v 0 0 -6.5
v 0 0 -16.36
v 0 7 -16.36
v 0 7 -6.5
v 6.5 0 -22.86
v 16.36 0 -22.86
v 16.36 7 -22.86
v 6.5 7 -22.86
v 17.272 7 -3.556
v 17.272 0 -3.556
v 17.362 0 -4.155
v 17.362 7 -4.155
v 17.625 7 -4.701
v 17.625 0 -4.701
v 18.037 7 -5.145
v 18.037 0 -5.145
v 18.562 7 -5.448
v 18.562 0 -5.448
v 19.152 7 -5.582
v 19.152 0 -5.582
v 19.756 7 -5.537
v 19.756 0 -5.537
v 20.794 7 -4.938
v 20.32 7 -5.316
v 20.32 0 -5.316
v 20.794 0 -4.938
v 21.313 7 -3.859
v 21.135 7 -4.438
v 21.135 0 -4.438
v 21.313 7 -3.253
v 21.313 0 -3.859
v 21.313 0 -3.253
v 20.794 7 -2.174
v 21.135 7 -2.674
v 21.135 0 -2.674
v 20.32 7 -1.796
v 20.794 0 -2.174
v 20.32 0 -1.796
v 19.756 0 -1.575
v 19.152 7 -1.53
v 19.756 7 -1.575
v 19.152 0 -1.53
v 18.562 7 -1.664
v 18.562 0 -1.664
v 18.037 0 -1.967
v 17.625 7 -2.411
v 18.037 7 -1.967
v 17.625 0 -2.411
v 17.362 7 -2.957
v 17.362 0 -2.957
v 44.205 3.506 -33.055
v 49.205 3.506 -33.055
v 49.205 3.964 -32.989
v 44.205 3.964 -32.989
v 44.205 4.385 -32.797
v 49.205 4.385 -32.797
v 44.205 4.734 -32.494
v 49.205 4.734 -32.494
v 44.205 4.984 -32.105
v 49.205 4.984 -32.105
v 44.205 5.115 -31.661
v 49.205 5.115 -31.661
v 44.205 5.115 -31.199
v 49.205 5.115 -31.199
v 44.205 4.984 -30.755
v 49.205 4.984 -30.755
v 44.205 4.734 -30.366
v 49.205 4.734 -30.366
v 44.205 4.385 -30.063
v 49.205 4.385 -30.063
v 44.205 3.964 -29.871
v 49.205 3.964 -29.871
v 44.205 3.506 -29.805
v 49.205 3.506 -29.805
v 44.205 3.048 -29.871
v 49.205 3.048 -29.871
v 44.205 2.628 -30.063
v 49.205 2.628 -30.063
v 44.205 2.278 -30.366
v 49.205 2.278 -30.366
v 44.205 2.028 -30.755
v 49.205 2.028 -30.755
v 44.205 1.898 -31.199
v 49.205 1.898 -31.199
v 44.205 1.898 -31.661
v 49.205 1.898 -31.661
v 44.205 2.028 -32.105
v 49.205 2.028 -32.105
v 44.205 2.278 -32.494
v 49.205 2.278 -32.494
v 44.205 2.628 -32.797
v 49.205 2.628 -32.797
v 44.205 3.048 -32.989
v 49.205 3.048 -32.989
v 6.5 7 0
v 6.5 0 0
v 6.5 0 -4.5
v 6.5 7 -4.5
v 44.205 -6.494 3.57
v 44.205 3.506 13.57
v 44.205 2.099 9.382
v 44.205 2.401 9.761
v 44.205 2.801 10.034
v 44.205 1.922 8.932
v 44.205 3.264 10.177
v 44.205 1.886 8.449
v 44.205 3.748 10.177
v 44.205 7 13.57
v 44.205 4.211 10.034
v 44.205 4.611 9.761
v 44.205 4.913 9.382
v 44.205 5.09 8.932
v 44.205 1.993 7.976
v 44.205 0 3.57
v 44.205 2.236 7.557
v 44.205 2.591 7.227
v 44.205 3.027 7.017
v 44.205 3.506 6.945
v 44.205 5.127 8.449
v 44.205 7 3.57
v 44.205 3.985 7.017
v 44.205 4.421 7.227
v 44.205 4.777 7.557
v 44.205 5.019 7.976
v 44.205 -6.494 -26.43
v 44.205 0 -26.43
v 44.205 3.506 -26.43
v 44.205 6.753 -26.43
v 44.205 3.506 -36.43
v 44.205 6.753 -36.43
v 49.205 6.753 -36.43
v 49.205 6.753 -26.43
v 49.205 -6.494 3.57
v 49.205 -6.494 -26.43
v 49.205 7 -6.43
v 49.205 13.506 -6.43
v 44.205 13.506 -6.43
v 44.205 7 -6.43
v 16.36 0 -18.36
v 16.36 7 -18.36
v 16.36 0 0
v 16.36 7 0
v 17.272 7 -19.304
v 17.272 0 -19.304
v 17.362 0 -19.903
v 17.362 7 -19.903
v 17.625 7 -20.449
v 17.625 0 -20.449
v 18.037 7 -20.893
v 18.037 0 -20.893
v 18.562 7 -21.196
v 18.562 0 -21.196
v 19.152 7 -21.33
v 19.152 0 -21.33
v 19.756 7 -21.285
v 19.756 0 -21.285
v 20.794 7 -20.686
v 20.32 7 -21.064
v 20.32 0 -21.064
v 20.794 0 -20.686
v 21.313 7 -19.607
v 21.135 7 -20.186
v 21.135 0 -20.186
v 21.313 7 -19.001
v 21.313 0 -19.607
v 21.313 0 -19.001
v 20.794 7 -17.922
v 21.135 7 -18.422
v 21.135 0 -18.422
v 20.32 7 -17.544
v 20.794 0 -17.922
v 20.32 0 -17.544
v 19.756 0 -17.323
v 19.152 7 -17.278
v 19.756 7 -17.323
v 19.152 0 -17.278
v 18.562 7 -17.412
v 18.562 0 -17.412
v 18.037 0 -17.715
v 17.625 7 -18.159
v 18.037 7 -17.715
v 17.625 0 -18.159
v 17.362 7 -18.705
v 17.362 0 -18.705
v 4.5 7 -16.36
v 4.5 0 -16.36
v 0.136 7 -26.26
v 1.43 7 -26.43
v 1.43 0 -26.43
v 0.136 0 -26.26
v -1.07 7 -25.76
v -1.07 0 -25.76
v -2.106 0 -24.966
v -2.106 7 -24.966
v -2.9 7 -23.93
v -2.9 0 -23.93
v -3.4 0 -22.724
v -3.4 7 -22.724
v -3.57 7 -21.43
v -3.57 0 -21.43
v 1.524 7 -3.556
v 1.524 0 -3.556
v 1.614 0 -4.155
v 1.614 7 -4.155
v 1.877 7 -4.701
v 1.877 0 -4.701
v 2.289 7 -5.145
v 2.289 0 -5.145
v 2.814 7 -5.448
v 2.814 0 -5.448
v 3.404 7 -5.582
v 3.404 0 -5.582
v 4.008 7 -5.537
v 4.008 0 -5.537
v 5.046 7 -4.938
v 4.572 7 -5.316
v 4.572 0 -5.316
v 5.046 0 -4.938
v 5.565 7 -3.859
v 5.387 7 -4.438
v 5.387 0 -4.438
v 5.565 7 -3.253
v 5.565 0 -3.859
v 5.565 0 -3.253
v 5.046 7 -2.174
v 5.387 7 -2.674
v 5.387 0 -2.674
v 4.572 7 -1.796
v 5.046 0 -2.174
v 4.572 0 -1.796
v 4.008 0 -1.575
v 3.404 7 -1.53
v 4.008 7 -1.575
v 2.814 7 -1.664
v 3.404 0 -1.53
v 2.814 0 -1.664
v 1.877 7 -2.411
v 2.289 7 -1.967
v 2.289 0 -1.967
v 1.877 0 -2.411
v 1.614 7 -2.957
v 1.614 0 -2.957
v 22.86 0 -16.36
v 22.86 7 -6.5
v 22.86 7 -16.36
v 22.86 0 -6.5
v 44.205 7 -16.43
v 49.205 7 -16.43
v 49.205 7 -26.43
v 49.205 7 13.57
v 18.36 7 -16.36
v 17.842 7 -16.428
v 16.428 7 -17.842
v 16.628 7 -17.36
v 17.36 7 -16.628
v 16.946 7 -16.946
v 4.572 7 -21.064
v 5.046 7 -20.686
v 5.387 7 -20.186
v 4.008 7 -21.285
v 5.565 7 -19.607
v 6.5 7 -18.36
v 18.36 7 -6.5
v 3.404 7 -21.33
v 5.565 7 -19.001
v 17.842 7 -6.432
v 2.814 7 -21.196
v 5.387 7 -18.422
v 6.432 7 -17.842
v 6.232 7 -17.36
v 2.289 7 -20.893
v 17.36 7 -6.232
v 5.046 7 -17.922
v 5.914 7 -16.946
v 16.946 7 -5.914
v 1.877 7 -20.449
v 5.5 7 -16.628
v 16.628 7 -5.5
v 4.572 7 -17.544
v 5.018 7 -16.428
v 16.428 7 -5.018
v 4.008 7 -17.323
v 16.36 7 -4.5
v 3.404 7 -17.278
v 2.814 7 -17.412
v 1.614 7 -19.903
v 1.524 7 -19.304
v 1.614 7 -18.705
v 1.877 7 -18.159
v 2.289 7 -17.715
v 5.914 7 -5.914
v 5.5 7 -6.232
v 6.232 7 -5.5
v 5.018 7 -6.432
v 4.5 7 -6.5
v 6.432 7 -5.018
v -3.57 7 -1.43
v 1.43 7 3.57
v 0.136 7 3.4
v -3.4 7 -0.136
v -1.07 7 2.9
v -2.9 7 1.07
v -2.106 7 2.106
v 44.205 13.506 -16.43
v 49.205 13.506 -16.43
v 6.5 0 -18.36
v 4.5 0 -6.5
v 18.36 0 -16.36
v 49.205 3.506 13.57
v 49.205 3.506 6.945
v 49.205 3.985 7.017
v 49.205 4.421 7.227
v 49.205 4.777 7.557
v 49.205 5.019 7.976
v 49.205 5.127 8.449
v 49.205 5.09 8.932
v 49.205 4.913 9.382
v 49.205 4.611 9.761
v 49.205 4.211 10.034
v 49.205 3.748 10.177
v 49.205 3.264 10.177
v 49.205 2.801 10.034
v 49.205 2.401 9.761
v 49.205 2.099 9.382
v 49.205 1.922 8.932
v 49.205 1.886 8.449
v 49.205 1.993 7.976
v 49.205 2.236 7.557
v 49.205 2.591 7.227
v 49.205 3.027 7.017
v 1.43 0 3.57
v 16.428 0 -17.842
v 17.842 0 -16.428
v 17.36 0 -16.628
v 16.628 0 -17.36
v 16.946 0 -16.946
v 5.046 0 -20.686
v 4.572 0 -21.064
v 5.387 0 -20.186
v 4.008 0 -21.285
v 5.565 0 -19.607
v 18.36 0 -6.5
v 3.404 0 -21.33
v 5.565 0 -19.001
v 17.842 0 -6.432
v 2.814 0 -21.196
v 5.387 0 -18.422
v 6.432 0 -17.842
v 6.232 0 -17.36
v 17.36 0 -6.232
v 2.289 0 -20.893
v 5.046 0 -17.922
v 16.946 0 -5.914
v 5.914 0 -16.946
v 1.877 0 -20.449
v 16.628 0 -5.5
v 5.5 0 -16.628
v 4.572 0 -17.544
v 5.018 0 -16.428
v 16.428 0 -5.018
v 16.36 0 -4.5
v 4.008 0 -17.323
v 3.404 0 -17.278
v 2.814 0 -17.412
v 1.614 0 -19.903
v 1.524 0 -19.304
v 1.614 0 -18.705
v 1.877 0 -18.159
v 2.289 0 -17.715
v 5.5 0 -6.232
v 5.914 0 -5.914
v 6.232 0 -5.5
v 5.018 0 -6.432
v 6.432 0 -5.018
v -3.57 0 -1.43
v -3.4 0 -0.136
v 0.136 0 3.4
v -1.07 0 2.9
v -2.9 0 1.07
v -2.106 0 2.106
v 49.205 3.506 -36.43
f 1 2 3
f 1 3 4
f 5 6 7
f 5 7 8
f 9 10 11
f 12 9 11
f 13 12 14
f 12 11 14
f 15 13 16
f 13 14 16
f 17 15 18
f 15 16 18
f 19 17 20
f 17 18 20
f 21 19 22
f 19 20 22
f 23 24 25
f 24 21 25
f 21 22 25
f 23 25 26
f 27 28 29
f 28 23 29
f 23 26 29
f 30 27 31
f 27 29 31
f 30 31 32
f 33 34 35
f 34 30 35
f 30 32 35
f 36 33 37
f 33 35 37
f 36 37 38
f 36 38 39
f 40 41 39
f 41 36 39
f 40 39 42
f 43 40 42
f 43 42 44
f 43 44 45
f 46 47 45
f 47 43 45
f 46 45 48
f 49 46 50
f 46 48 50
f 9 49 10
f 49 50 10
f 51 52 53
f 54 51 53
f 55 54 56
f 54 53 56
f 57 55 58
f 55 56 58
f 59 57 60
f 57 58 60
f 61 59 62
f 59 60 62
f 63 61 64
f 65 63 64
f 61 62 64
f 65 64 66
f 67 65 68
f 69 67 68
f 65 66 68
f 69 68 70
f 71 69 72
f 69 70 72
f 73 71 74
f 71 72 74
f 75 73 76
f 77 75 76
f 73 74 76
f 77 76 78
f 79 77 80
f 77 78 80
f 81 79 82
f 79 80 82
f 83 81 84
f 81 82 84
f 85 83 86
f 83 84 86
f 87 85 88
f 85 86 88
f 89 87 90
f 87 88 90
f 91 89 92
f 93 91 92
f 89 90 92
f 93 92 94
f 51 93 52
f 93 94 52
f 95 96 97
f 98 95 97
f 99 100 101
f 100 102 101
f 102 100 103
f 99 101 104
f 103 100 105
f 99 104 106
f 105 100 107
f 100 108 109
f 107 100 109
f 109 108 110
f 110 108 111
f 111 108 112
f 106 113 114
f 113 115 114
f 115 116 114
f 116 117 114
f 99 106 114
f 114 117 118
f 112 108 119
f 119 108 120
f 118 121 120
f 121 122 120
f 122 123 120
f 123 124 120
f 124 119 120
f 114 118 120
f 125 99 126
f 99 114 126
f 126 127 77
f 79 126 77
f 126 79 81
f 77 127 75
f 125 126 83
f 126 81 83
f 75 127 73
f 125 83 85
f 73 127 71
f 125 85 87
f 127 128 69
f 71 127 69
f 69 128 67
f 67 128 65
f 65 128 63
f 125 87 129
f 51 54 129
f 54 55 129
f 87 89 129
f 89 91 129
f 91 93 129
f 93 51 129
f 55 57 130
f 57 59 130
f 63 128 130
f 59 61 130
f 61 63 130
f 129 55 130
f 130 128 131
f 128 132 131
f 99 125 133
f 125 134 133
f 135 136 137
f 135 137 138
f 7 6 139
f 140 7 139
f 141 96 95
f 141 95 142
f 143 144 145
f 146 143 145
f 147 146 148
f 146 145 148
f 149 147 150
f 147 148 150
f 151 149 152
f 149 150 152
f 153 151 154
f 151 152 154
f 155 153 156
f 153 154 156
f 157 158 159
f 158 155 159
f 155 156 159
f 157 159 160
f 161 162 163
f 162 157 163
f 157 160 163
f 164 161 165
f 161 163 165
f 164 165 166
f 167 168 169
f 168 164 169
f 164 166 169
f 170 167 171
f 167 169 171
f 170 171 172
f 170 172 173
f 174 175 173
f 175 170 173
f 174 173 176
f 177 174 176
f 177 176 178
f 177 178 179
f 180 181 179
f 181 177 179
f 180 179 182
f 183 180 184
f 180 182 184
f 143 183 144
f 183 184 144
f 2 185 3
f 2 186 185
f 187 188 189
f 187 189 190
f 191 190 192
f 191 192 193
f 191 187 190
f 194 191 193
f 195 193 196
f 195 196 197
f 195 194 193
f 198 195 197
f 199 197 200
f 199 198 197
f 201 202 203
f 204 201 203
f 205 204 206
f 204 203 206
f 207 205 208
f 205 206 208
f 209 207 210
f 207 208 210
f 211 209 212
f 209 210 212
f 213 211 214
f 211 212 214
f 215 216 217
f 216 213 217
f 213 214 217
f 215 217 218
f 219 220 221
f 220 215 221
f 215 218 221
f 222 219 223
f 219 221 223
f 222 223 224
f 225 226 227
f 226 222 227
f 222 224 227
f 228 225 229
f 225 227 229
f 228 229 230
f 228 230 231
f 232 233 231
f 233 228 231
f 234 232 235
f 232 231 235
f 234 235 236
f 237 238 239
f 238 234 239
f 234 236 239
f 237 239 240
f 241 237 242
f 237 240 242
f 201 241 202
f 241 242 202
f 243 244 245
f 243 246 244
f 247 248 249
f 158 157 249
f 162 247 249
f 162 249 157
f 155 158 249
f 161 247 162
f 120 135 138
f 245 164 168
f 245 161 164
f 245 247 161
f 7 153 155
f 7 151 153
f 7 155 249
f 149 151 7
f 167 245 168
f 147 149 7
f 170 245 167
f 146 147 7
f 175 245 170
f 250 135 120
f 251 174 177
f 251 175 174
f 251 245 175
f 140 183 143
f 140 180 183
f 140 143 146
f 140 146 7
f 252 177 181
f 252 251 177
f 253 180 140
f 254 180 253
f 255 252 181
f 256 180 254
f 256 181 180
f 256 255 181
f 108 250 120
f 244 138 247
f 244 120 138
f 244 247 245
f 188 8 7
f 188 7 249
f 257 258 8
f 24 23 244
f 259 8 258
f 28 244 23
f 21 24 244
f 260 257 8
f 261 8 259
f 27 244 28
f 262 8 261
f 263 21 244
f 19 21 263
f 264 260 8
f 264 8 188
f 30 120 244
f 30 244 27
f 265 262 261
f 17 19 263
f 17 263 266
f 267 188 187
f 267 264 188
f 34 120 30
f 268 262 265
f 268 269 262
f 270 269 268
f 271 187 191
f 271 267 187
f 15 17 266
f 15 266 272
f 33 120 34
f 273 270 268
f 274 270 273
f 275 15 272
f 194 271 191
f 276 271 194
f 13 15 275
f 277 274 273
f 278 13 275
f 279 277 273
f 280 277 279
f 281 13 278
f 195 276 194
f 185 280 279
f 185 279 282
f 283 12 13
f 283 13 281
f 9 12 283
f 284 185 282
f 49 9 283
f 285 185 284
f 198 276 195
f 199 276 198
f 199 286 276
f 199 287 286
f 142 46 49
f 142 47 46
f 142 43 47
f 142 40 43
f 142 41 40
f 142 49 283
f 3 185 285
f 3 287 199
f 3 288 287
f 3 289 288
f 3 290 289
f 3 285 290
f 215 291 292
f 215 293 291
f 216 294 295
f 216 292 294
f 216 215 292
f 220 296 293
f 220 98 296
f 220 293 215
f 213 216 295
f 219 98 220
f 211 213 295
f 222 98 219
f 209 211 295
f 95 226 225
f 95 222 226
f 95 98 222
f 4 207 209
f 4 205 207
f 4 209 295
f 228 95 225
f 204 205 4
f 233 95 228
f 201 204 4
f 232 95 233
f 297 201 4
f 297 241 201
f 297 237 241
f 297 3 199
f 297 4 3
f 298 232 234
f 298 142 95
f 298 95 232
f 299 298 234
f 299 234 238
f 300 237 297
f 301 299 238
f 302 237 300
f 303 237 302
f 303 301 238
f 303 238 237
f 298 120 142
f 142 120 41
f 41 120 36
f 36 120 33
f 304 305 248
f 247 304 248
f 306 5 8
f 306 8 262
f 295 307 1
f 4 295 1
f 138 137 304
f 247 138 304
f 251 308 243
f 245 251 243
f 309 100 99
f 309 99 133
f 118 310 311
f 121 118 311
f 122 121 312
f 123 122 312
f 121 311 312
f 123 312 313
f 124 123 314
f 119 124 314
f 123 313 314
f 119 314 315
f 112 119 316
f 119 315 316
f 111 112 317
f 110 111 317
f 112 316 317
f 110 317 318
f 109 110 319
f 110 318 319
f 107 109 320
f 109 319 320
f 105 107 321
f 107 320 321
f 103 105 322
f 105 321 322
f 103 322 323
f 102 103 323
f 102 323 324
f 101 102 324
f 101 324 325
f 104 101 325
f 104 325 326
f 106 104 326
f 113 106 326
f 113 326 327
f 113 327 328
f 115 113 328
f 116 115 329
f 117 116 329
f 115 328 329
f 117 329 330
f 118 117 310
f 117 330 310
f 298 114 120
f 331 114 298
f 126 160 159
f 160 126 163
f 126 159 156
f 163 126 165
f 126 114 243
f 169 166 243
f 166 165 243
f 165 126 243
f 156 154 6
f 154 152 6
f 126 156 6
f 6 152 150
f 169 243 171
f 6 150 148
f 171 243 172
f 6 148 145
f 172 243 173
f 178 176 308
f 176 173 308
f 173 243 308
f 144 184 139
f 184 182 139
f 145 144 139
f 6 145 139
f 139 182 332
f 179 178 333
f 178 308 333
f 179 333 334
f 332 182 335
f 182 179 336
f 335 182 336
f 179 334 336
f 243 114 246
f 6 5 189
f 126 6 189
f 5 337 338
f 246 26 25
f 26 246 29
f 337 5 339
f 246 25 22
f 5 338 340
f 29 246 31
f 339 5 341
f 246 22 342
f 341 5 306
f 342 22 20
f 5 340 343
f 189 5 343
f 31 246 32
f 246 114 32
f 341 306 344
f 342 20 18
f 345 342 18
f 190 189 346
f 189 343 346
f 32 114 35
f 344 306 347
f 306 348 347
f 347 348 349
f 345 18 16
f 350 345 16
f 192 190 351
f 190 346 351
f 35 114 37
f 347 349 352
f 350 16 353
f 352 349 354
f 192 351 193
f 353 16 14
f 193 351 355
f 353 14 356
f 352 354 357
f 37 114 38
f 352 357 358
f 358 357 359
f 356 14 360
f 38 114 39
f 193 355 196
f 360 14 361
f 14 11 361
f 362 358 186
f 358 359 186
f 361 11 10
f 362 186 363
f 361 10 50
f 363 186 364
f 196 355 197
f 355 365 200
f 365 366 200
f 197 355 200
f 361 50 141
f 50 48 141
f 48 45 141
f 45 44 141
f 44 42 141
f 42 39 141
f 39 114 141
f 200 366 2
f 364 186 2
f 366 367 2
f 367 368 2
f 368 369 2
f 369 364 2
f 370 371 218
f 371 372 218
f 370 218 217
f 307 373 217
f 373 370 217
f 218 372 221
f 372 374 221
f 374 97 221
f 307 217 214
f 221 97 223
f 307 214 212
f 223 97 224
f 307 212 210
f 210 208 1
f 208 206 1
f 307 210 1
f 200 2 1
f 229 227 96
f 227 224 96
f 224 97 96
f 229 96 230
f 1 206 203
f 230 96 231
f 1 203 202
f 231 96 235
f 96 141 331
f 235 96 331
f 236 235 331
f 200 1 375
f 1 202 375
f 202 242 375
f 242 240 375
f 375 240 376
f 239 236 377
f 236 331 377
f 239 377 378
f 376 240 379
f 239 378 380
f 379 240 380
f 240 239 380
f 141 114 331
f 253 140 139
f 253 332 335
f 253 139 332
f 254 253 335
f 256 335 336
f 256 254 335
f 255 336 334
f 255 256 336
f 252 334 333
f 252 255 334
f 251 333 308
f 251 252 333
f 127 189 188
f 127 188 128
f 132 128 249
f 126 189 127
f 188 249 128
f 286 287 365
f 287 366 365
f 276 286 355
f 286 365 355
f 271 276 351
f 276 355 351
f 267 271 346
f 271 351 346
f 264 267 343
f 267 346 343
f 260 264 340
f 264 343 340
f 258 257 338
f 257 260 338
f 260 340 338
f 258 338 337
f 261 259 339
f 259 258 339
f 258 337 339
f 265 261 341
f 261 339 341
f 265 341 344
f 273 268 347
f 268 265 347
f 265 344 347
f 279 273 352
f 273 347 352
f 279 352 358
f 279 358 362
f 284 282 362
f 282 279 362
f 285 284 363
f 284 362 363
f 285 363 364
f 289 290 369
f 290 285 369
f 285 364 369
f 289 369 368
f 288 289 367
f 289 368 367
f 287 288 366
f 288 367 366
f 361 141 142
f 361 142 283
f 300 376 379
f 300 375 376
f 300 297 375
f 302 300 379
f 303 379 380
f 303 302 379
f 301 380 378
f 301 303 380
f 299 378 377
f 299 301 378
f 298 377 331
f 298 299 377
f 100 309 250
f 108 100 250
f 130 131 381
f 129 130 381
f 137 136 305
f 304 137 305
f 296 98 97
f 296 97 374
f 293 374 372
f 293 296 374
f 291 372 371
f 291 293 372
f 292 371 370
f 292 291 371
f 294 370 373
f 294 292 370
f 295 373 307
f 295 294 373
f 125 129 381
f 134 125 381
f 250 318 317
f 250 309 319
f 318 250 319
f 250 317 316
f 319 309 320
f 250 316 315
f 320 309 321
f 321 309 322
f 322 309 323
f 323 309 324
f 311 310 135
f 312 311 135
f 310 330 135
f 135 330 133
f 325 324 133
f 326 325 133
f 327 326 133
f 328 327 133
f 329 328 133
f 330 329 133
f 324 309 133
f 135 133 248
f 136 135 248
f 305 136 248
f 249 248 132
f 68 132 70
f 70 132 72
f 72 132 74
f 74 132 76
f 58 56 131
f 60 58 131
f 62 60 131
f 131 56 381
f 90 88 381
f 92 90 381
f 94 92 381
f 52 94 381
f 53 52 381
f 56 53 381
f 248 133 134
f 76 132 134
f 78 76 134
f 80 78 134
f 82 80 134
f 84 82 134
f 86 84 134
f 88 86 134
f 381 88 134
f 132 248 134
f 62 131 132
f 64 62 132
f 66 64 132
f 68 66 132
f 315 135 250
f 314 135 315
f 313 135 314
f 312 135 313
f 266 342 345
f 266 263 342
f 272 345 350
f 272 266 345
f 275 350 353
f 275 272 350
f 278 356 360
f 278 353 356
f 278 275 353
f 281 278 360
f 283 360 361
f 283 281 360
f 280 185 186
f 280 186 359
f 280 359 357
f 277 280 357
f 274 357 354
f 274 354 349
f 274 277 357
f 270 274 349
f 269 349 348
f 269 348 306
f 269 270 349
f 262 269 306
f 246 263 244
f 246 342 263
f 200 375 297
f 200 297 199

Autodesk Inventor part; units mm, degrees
ref_plane "YZ Plane" through (0, 0, 0) normal (1, 0, 0) x (0, 1, 0)
ref_plane "XZ Plane" through (0, 0, 0) normal (0, 1, 0) x (-1, 0, 0)
ref_plane "XY Plane" through (0, 0, 0) normal (0, 0, 1) x (1, 0, 0)
sketch "Sketch1" plane through (0, 0, 0) normal (0, 1, 0) x (-1, 0, 0)
  line L0 (0, 0) -> (-22.86, 0)
  line L1 (-22.86, 0) -> (-22.86, -22.86)
  line L2 (-22.86, -22.86) -> (0, -22.86)
  line L3 (0, -22.86) -> (0, 0)
  line L4 (-22.86, -22.86) -> (-19.304, -22.86)
  line L5 (-19.304, -22.86) -> (-19.304, -19.304) construction
  line L6 (-19.304, -19.304) -> (-22.86, -19.304) construction
  line L7 (-22.86, -19.304) -> (-22.86, -22.86)
  line L8 (0, -22.86) -> (-3.556, -22.86)
  line L9 (-3.556, -22.86) -> (-3.556, -19.304) construction
  line L10 (-3.556, -19.304) -> (0, -19.304) construction
  line L11 (0, -19.304) -> (0, -22.86)
  line L12 (0, 0) -> (-3.556, 0)
  line L13 (-3.556, 0) -> (-3.556, -3.556) construction
  line L14 (-3.556, -3.556) -> (0, -3.556) construction
  line L15 (0, -3.556) -> (0, 0)
  line L16 (-22.86, 0) -> (-19.304, 0)
  line L17 (-19.304, 0) -> (-19.304, -3.556) construction
  line L18 (-19.304, -3.556) -> (-22.86, -3.556) construction
  line L19 (-22.86, -3.556) -> (-22.86, 0)
  circle A0 centre (-3.556, -19.304) radius 2.032
  circle A1 centre (-19.304, -19.304) radius 2.032
  circle A2 centre (-19.304, -3.556) radius 2.032
  circle A3 centre (-3.556, -3.556) radius 2.032
  line L20 (3.57, -26.43) -> (-26.43, -26.43)
  line L21 (-26.43, -26.43) -> (-26.43, 3.57)
  line L22 (-26.43, 3.57) -> (3.57, 3.57)
  line L23 (3.57, 3.57) -> (3.57, -26.43)
  line L24 (0, 0) -> (-6.5, 0)
  line L25 (-6.5, 0) -> (-6.5, -6.5)
  line L26 (-6.5, -6.5) -> (0, -6.5)
  line L27 (0, -6.5) -> (0, 0)
  line L28 (0, -22.86) -> (-6.5, -22.86)
  line L29 (-6.5, -22.86) -> (-6.5, -16.36)
  line L30 (-6.5, -16.36) -> (0, -16.36)
  line L31 (0, -16.36) -> (0, -22.86)
  line L32 (-22.86, -22.86) -> (-16.36, -22.86)
  line L33 (-16.36, -22.86) -> (-16.36, -16.36)
  line L34 (-16.36, -16.36) -> (-22.86, -16.36)
  line L35 (-22.86, -16.36) -> (-22.86, -22.86)
  line L36 (-22.86, 0) -> (-16.36, 0)
  line L37 (-16.36, 0) -> (-16.36, -6.5)
  line L38 (-16.36, -6.5) -> (-22.86, -6.5)
  line L39 (-22.86, -6.5) -> (-22.86, 0)
  line L40 (-26.43, 3.57) -> (-49.205, 3.57)
  line L41 (-49.205, 3.57) -> (-49.205, -26.43)
  line L42 (-49.205, -26.43) -> (-26.43, -26.43)
  line L43 (-26.43, -26.43) -> (-26.43, 3.57)
  circle A4 centre (-11.43, -11.43) radius 5
  point P0 (0, -16.36)
  point P1 (0, -6.5)
  dimension "d2" = 22.86
  dimension "d3" = 22.86
  dimension "d4" = 3.556
  dimension "d5" = 3.556
  dimension "d6" = 3.556
  dimension "d7" = 3.556
  dimension "d8" = 3.556
  dimension "d9" = 3.556
  dimension "d10" = 3.556
  dimension "d11" = 3.556
  dimension "d12" = 4.064
  dimension "d13" = 4.064
  dimension "d14" = 4.064
  dimension "d15" = 4.064
  dimension "d16" = 30
  dimension "d17" = 30
  dimension "d18" = 3.57
  dimension "d19" = 3.57
  dimension "d20" = 6.5
  dimension "d21" = 6.5
  dimension "d22" = 6.5
  dimension "d23" = 6.5
  dimension "d24" = 6.5
  dimension "d25" = 6.5
  dimension "d26" = 6.5
  dimension "d31" = 10
  dimension "d32" = 15
  dimension "d33" = 15
  dimension "d34" = 37.775
extrude "Extrusion1" add sketch "Sketch1" along normal blind 7 contours L3 L26 L25 L0 | L37 L38 L1 L0 | L3 L2 L29 L30 | L34 L33 L2 L1 | L20 L21 L22 L23 | L42 L41 L40 L21
fillet "Fillet1" radius 2 4 edges at (6.5, 3.5, -16.36) (16.36, 3.5, -16.36) (16.36, 3.5, -6.5) (6.5, 3.5, -6.5)
sketch "Sketch4" plane through (49.205, 0, 3.57) normal (1, 0, 0) x (0, 0, -1)
  line L0 (-10, 13.5061) -> (40, 13.5061)
  line L1 (40, 13.5061) -> (40, -6.4939)
  line L2 (40, -6.4939) -> (-10, -6.4939)
  line L3 (-10, -6.4939) -> (-10, 13.5061)
  line L4 (-10, 13.5061) -> (40, -6.4939) construction
  line L5 (40, 13.5061) -> (-10, -6.4939) construction
  line L6 (30, 0) -> (30, 7) projected
  line L7 (15, 3.5061) -> (35, 3.5061)
  circle A0 centre (35, 3.5061) radius 1.625
  circle A1 centre (-5, 3.5061) radius 1.625
  line L8 (-10, 0) -> (40, 0)
  line L9 (40, 0) -> (40, 13.5061)
  line L10 (40, 13.5061) -> (-10, 13.5061)
  line L11 (-10, 13.5061) -> (-10, 0)
  line L12 (-10, -6.4939) -> (0, -6.4939)
  line L13 (0, -6.4939) -> (0, 0)
  line L14 (0, 0) -> (-10, 0)
  line L15 (-10, 0) -> (-10, -6.4939)
  line L16 (40, -6.4939) -> (30, -6.4939)
  line L17 (30, -6.4939) -> (30, 0)
  line L18 (30, 0) -> (40, 0)
  line L19 (40, 0) -> (40, -6.4939)
  line L20 (40, 13.5061) -> (20, 13.5061)
  line L21 (20, 13.5061) -> (20, 6.753)
  line L22 (20, 6.753) -> (40, 6.753)
  line L23 (40, 6.753) -> (40, 13.5061)
  line L24 (0, 7) -> (30, 7) projected
  line L25 (-10, 13.5061) -> (10, 13.5061)
  line L26 (10, 13.5061) -> (10, 7)
  line L27 (10, 7) -> (-10, 7)
  line L28 (-10, 7) -> (-10, 13.5061)
  point P0 (3.57, 0)
  point P1 (40, -3.247)
  point P2 (-10, -3.247)
  point P3 (-10, 10.253)
  point P4 (10, 10.253)
  point P5 (40, 10.1296)
  point P6 (20, 13.5061)
  point P7 (10, 13.5061)
  point P8 (-10, 7)
  point P9 (40, 6.753)
  dimension "d46" = 50
  dimension "d47" = 20
  dimension "d48" = 15
  dimension "d49" = 10
  dimension "d56" = 20
  dimension "d57" = 20
  dimension "d58" = 3.25
  dimension "d59" = 3.25
  dimension "d66" = 10
  dimension "d67" = 20
  dimension "d68" = 20
extrude "Extrusion4" add sketch "Sketch4" against normal blind 5 contours L0 L21 L24 L26 | L27 L24 L21 L22 L6 L8 L3 | L8 L13 L2 L3 | L8 L17 L2 L13 | L1 L8 L6 L22 | L8 L1 L2 L17
fillet "Fillet2" radius 5 2 edges at (-3.57, 3.5, -26.43) (-3.57, 3.5, 3.57)
chamfer "Chamfer1" distance 10 angle 45 2 edges at (46.705, -6.4939, 13.57) (46.705, -6.4939, -36.43)
sketch "Sketch5" plane through (0, 0, 0) normal (0, -1, 0) x (1, 0, 0)
  line L0 (1.43, 3.57) -> (44.205, 3.57) projected
  line L1 (-3.57, -26.43) -> (22.8175, -26.43) construction
  line L2 (22.8175, -26.43) -> (22.8175, 3.57) construction
  line L3 (22.8175, 3.57) -> (-3.57, 3.57) construction
  line L4 (-3.57, 3.57) -> (-3.57, -26.43) construction
  line L5 (0, -22.86) -> (22.8175, -22.86) construction
  line L6 (22.8175, -22.86) -> (22.8175, 0) construction
  line L7 (22.8175, 0) -> (0, 0) construction
  line L8 (0, 0) -> (0, -22.86) construction
  circle A0 centre (11.43, -11.43) radius 11.43 construction
  line L9 (0, -6.5) -> (0, -16.36) projected
  line L10 (16.36, 0) -> (6.5, 0) projected
  line L11 (6.5, -22.86) -> (16.36, -22.86) projected
sketch "Sketch6" plane through (0, 0, 0) normal (0, -1, 0) x (1, 0, 0)
  line L0 (0, -6.5) -> (0, -16.36) projected
  line L1 (16.36, 0) -> (6.5, 0) projected
  line L2 (22.86, -16.36) -> (22.86, -6.5) projected
  line L3 (6.5, -22.86) -> (16.36, -22.86) projected
  circle A0 centre (11.43, -11.43) radius 11.43
  point P0 (0, 0)
properties part number "as5600mount"
